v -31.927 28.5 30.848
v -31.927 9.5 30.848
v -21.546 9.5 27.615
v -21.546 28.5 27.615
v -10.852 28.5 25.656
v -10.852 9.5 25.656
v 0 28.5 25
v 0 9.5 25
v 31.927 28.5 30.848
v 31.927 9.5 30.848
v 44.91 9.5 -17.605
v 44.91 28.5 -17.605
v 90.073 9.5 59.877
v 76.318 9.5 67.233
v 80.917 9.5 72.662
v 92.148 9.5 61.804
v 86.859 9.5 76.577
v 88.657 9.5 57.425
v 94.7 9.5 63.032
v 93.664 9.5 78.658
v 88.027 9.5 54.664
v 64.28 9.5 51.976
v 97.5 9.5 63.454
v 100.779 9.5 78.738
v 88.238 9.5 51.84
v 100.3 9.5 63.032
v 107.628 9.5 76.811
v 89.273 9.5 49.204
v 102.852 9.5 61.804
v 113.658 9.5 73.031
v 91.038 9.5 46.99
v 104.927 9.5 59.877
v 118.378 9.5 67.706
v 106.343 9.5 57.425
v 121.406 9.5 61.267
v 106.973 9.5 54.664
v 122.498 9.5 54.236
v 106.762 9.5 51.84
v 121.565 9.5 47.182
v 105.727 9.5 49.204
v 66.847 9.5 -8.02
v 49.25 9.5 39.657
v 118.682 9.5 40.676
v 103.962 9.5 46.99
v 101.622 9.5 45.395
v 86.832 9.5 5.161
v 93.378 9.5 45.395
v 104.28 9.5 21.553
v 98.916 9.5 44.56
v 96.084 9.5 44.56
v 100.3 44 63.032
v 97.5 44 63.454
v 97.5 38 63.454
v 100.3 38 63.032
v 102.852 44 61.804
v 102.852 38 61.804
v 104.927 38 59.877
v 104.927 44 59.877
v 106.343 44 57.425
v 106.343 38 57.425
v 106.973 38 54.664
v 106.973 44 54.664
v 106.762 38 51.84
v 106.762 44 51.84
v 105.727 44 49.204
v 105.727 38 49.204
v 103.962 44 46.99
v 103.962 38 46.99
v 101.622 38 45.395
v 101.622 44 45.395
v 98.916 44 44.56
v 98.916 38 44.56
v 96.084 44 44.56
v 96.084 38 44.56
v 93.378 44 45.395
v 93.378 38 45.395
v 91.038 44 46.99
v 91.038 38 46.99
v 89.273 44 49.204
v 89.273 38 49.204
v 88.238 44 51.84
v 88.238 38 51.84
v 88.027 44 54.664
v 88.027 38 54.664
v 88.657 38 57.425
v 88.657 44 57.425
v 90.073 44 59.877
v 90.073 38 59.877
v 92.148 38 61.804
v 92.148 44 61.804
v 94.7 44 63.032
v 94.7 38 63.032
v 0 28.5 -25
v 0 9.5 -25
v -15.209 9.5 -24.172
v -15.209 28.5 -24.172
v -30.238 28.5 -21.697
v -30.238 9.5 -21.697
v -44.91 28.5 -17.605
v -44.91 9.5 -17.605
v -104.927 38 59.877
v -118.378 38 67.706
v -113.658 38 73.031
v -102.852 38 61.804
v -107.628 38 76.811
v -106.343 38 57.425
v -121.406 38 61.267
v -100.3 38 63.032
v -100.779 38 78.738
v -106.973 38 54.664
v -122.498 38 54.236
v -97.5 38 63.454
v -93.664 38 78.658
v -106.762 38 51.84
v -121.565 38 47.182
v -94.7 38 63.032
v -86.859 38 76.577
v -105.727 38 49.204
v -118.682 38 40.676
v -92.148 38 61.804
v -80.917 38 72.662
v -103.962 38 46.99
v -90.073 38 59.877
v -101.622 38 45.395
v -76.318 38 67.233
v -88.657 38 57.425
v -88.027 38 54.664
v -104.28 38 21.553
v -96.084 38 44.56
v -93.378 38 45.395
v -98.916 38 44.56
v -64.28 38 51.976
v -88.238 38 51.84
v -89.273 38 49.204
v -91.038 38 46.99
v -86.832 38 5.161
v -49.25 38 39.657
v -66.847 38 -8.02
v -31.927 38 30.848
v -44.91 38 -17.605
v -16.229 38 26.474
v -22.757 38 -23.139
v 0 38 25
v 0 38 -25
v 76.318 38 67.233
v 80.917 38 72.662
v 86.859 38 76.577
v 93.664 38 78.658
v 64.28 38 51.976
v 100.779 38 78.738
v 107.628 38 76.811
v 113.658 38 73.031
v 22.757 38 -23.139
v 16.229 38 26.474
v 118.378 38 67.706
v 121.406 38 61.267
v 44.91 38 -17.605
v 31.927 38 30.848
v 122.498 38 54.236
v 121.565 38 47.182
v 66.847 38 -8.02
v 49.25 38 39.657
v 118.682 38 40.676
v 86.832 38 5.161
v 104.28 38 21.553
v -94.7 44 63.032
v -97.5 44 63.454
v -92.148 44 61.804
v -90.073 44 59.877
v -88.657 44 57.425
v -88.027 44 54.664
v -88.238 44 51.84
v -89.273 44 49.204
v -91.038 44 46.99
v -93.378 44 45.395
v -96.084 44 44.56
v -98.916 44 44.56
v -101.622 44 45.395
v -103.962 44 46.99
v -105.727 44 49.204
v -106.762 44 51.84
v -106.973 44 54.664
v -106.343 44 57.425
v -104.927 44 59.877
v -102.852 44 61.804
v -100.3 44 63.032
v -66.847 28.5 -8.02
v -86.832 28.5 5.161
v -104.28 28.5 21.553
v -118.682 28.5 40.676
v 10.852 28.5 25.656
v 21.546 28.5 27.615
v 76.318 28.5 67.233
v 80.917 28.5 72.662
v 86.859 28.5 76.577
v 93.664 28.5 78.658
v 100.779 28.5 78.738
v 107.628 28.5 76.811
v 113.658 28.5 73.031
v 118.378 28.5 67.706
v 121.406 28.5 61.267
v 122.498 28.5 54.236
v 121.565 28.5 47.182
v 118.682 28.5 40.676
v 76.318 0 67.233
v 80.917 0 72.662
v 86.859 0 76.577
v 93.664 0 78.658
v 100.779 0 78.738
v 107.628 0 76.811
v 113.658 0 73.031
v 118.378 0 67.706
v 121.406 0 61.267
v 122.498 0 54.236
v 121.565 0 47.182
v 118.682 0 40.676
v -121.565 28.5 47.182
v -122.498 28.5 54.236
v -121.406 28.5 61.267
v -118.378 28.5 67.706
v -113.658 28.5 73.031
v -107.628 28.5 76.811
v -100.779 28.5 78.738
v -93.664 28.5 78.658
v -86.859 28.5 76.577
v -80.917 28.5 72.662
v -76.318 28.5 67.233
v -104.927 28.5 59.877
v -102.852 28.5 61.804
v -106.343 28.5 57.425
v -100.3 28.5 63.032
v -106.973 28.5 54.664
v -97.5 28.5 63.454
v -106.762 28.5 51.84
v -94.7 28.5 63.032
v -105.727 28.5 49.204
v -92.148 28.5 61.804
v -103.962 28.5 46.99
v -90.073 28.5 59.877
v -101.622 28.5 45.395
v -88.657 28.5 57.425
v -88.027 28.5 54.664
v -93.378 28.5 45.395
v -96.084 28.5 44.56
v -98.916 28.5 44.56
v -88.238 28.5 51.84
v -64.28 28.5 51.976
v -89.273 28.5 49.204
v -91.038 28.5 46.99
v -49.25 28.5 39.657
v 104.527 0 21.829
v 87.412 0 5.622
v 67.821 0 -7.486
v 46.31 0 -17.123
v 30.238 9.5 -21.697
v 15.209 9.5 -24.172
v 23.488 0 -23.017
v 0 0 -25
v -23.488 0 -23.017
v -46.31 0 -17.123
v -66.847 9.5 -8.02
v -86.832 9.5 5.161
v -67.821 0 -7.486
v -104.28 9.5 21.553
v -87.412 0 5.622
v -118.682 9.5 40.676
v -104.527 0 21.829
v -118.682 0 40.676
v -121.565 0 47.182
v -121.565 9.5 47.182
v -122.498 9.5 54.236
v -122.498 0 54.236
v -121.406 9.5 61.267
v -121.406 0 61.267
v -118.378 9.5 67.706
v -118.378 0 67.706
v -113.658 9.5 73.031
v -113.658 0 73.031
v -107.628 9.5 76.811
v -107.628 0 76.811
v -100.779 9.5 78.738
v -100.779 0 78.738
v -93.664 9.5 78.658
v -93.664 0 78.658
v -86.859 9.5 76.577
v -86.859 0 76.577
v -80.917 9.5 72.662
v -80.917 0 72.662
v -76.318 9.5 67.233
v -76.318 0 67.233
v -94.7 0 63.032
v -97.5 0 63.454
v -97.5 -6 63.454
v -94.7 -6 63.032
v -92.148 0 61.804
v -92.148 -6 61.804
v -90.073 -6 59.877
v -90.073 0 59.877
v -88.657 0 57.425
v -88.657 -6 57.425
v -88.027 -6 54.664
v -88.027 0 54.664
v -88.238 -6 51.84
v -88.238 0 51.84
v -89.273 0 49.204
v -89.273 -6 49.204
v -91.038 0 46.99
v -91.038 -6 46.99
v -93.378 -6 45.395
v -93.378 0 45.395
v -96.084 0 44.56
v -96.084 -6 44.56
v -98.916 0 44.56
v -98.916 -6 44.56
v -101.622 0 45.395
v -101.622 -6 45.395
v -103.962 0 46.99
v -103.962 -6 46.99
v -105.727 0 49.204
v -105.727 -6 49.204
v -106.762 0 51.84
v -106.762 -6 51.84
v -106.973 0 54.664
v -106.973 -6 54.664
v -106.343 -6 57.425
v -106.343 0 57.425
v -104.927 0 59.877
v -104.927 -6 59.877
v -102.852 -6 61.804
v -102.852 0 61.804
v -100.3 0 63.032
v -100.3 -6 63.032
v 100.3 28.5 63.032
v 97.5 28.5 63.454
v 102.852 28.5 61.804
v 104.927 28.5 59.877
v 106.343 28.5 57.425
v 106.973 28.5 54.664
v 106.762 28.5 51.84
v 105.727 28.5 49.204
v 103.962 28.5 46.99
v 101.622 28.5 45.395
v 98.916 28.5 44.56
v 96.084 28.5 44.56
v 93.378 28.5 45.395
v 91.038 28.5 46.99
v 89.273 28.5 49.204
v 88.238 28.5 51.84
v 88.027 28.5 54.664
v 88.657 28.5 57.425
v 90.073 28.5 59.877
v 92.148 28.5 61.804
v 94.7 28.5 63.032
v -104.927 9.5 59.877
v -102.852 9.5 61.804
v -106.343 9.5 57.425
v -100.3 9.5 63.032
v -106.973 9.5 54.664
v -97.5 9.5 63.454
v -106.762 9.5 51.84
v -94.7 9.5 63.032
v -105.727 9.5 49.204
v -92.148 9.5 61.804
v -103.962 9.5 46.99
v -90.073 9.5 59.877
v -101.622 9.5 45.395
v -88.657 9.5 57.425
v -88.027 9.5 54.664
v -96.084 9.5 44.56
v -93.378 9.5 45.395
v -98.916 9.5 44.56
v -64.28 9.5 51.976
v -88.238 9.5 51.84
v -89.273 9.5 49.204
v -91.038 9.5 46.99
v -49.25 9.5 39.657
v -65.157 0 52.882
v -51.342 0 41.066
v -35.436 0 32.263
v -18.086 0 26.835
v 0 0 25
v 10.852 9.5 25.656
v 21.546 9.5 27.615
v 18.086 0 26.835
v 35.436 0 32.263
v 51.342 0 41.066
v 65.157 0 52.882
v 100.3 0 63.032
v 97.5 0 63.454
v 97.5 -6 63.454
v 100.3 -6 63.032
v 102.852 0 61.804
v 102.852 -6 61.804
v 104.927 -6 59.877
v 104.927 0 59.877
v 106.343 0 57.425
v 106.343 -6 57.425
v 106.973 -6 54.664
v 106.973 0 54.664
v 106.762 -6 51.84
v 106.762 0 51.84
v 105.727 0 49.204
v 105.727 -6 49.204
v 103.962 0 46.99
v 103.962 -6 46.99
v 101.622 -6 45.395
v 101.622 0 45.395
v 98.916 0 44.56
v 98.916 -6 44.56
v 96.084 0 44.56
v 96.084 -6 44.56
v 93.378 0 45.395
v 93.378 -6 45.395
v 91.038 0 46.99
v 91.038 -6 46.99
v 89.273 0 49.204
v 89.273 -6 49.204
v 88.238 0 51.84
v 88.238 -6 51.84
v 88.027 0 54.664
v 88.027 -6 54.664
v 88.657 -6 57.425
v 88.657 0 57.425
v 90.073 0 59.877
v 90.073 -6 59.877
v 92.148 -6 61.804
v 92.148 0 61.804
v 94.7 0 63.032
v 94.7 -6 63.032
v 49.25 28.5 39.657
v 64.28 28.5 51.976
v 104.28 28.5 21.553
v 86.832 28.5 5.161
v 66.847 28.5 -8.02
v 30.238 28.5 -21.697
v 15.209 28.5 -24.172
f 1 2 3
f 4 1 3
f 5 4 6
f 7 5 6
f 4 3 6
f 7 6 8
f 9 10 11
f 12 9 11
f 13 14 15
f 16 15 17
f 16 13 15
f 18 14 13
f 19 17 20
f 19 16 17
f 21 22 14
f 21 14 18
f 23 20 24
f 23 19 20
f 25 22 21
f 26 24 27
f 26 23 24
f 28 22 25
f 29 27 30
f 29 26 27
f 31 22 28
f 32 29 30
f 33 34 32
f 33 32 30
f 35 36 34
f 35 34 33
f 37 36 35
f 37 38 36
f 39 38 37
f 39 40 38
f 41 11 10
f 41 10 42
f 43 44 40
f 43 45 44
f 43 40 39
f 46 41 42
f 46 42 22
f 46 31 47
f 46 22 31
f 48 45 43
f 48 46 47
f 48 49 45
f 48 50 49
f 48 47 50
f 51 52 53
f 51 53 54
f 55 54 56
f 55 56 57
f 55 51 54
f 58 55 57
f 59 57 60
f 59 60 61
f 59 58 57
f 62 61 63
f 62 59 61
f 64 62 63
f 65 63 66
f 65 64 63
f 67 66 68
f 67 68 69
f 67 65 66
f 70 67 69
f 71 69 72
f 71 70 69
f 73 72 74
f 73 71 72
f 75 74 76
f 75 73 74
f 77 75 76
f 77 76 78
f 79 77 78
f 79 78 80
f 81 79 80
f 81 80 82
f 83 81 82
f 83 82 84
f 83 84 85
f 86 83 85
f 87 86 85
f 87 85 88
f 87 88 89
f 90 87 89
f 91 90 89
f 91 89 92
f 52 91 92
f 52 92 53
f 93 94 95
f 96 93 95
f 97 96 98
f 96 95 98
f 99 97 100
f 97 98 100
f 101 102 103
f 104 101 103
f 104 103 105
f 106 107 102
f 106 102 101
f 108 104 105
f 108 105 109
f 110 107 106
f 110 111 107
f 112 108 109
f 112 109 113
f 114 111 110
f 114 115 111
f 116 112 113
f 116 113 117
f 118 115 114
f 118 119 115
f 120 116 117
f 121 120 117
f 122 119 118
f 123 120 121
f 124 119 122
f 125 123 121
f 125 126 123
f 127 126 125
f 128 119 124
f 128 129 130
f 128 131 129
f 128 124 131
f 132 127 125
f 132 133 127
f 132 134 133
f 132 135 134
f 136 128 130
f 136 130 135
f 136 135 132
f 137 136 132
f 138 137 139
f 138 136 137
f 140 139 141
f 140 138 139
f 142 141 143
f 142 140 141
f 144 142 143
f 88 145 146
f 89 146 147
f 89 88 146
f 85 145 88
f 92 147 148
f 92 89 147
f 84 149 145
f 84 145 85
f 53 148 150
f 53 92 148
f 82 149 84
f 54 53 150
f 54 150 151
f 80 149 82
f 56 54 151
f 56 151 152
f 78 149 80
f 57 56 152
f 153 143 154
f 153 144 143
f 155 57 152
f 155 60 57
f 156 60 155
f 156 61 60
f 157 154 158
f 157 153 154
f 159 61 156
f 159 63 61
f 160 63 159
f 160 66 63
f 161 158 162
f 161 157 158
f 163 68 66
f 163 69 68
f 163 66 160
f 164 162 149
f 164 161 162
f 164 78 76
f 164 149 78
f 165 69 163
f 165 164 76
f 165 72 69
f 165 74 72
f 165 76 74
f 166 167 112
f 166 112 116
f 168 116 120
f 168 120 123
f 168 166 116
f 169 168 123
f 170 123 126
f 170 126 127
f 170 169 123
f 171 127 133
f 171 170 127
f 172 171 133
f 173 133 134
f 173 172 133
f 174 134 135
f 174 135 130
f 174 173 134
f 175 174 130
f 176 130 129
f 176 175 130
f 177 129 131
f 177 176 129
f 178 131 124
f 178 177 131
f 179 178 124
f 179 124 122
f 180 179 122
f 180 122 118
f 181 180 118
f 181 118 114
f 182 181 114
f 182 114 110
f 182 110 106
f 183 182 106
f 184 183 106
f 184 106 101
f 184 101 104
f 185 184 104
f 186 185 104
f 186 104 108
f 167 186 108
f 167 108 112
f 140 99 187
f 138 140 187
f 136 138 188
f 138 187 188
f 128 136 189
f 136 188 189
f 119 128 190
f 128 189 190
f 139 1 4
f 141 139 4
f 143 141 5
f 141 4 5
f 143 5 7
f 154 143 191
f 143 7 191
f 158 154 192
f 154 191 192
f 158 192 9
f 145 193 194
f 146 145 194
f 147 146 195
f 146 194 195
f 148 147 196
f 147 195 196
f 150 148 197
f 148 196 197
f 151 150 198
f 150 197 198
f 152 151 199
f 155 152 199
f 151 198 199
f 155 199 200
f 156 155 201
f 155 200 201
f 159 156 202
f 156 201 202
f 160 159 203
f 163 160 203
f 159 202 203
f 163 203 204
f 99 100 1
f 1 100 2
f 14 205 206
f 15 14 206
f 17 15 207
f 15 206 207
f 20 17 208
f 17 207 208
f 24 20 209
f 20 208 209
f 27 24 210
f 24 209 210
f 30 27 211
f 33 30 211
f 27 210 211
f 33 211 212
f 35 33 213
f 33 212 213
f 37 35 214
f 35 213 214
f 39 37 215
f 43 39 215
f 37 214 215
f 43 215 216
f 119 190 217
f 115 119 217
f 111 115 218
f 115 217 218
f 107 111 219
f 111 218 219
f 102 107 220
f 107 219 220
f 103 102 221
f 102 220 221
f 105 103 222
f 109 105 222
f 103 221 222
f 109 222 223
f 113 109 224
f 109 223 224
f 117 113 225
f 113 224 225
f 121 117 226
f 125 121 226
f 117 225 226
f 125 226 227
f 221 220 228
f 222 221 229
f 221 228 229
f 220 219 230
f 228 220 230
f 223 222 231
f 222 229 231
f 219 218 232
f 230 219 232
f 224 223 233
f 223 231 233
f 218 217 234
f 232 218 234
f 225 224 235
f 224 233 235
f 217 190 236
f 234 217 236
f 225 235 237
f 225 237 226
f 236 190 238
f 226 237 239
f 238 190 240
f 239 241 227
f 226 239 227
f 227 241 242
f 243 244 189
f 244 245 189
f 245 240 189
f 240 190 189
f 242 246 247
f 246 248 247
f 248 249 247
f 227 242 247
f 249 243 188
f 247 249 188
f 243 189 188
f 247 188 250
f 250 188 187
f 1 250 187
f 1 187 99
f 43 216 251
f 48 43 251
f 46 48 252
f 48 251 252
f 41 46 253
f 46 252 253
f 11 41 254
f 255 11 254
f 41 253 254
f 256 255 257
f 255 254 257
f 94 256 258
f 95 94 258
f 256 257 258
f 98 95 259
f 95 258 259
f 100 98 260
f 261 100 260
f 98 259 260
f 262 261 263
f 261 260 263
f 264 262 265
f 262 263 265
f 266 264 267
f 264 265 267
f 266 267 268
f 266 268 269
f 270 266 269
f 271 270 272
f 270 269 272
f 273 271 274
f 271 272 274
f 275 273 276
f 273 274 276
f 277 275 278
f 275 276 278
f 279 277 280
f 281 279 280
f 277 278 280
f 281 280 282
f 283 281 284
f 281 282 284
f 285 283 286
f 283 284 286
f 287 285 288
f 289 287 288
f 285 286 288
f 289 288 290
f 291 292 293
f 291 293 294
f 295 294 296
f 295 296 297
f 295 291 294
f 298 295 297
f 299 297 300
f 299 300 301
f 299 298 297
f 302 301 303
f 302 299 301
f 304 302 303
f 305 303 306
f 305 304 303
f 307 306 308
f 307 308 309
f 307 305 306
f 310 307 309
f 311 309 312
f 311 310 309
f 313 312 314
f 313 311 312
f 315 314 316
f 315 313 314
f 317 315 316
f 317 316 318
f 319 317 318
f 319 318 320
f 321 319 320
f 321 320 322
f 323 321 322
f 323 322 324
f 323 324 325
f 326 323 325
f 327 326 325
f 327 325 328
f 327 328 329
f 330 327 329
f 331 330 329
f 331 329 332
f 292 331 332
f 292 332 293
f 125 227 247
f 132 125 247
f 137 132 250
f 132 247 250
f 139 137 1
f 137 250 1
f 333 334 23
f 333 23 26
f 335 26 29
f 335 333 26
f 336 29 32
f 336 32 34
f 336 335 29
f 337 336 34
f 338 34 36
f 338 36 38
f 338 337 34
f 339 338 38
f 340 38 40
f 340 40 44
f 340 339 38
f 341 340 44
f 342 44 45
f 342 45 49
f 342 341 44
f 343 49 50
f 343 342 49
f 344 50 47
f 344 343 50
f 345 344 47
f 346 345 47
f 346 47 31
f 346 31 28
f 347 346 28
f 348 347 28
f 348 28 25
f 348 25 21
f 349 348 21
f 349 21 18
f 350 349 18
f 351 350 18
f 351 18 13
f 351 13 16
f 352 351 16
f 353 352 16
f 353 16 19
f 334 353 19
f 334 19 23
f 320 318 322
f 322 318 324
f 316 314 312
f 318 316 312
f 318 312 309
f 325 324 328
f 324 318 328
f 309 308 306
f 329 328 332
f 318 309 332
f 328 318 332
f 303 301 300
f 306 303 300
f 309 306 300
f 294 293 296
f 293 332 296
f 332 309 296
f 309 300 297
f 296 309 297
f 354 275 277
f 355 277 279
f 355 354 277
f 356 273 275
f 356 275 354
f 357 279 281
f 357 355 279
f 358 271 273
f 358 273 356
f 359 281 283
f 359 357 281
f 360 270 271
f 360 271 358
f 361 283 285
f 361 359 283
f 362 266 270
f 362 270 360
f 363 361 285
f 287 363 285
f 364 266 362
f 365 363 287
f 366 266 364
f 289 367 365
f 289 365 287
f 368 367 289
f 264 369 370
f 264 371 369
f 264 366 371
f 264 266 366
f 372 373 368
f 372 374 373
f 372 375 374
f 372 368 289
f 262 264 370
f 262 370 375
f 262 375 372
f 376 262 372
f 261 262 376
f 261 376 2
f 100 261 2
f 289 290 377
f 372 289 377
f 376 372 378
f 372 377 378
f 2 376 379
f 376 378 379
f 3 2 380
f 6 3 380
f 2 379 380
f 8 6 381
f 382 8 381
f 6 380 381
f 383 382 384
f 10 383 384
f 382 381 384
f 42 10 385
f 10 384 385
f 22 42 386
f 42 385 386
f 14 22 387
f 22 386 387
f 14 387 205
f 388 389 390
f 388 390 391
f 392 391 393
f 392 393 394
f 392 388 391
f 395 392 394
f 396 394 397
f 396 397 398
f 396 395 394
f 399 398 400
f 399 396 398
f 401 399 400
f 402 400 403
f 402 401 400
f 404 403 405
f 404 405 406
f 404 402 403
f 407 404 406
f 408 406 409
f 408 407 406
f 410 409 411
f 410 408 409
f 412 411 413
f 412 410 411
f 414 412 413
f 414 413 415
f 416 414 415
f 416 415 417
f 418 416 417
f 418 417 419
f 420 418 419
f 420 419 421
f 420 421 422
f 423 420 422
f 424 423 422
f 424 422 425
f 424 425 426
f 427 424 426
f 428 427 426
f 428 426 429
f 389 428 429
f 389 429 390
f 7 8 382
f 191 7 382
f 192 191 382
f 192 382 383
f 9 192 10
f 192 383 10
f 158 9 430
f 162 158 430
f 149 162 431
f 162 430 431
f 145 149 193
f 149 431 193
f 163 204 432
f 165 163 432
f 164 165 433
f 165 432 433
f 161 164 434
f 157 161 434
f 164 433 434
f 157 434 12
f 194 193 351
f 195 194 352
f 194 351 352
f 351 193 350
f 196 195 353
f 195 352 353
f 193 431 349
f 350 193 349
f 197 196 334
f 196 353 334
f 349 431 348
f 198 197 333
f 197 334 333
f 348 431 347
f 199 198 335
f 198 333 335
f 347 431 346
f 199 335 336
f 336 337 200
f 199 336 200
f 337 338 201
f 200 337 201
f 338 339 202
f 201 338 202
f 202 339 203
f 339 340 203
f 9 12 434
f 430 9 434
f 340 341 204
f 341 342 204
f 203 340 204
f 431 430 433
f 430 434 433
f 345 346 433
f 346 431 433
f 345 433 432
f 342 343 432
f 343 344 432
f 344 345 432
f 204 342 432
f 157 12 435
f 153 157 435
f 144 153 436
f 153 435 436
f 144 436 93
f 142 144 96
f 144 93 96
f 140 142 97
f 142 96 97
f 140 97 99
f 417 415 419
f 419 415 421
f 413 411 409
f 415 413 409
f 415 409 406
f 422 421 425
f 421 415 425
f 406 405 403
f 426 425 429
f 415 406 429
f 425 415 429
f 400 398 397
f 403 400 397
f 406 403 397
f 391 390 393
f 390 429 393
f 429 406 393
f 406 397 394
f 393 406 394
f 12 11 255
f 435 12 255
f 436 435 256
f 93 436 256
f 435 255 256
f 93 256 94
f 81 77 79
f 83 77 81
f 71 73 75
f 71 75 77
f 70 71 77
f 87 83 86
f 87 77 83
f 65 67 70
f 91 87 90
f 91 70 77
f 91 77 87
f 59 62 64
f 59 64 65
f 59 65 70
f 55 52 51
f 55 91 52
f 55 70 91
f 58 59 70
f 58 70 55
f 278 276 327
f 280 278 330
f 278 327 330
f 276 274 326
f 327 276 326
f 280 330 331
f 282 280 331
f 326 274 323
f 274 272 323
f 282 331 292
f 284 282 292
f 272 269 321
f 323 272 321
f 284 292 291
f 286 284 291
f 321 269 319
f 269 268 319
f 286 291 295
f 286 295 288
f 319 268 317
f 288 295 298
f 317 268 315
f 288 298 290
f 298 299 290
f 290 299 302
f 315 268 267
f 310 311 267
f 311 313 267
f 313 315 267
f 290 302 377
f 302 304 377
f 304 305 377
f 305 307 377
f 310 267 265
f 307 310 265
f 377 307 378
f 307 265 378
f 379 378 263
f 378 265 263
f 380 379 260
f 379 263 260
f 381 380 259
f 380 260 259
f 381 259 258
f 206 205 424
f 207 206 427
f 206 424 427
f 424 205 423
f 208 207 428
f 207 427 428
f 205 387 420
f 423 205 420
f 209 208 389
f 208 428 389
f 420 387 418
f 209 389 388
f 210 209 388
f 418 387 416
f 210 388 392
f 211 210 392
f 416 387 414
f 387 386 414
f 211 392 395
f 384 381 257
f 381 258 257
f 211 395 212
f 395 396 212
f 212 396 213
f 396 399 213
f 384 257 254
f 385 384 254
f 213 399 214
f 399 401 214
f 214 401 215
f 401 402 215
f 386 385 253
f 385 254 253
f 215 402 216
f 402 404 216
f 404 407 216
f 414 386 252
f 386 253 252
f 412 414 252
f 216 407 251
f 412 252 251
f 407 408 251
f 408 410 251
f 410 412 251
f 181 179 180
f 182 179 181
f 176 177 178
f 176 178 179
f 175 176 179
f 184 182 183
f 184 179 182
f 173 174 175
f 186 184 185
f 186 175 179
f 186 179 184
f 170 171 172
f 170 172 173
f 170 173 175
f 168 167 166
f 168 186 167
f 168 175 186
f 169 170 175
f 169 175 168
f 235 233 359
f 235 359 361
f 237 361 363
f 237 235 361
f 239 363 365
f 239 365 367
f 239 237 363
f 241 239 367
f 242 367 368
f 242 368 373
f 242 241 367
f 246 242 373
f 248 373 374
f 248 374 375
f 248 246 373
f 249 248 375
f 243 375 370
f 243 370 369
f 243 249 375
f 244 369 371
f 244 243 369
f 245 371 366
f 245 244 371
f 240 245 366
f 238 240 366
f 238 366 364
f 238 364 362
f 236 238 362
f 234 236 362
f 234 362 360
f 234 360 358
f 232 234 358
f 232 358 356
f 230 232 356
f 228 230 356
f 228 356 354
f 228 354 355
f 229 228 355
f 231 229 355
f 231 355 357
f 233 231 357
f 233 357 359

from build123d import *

# Parameters (mm, degrees)
BOSS_EXTRUDE1_DEPTH = 9.5
BOSS_EXTRUDE2_DEPTH = 19
BOSS_EXTRUDE3_DEPTH = 9.5
SKETCH4_R           = 9.5
CUT_EXTRUDE1_DEPTH  = 151.612195549
BOSS_EXTRUDE4_START = 6
SKETCH4_2_R         = 9.5
BOSS_EXTRUDE4_DEPTH = 50


with BuildPart() as part:
    # Sketch1 → Boss-Extrude1 (new body)
    with BuildSketch(Plane(origin=(0, 0, 0), x_dir=(1, 0, 0), z_dir=(0, 1, 0))):
        with BuildLine():
            ThreePointArc((118.682293684, -40.676118471), (0, 25), (-118.682293684, -40.676118471))
            ThreePointArc((-118.682293684, -40.676118471), (-110.778193938, -75.136606094), (-76.317706316, -67.232506348))
            ThreePointArc((-76.317706316, -67.232506348), (0, -25), (76.317706316, -67.232506348))
            ThreePointArc((76.317706316, -67.232506348), (110.778193938, -75.136606094), (118.682293684, -40.676118471))
        make_face()
    extrude(amount=BOSS_EXTRUDE1_DEPTH)

    # Sketch2 → Boss-Extrude2 (add)
    with BuildSketch(Plane(origin=(0, 9.5, 0), x_dir=(1, 0, 0), z_dir=(0, 1, 0))):
        with BuildLine():
            ThreePointArc((-31.926647669, -30.848128785), (0, -25), (31.926647669, -30.848128785))
            Line((31.926647669, -30.848128785), (44.909728312, 17.605387816))
            ThreePointArc((44.909728312, 17.605387816), (0, 25), (-44.909728312, 17.605387816))
            Line((-44.909728312, 17.605387816), (-31.926647669, -30.848128785))
        make_face()
    extrude(amount=BOSS_EXTRUDE2_DEPTH)

    # Sketch3 → Boss-Extrude3 (add)
    with BuildSketch(Plane(origin=(0, 28.5, 0), x_dir=(1, 0, 0), z_dir=(0, 1, 0))):
        with BuildLine():
            ThreePointArc((76.317706316, -67.232506348), (110.778193938, -75.136606094), (118.682293684, -40.676118471))
            ThreePointArc((118.682293684, -40.676118471), (0, 25), (-118.682293684, -40.676118471))
            ThreePointArc((-118.682293684, -40.676118471), (-110.778193938, -75.136606094), (-76.317706316, -67.232506348))
            ThreePointArc((-76.317706316, -67.232506348), (0, -25), (76.317706316, -67.232506348))
        make_face()
    extrude(amount=BOSS_EXTRUDE3_DEPTH)

    # Sketch4 → Cut-Extrude1 (cut, through all)
    with BuildSketch(Plane(origin=(0, 38, 0), x_dir=(1, 0, 0), z_dir=(0, 1, 0))):
        with Locations((-97.5, -53.95431241)):
            Circle(SKETCH4_R)
        with Locations((97.5, -53.95431241)):
            Circle(SKETCH4_R)
    extrude(amount=-CUT_EXTRUDE1_DEPTH, mode=Mode.SUBTRACT)

    # Sketch4<2> → Boss-Extrude4 (add)
    with BuildSketch(Plane(origin=(0, 38, 0), x_dir=(1, 0, 0), z_dir=(0, 1, 0)).offset(BOSS_EXTRUDE4_START)):
        with Locations((-97.5, -53.95431241)):
            Circle(SKETCH4_2_R)
        with Locations((97.5, -53.95431241)):
            Circle(SKETCH4_2_R)
    extrude(amount=-BOSS_EXTRUDE4_DEPTH)


solid = part.part
